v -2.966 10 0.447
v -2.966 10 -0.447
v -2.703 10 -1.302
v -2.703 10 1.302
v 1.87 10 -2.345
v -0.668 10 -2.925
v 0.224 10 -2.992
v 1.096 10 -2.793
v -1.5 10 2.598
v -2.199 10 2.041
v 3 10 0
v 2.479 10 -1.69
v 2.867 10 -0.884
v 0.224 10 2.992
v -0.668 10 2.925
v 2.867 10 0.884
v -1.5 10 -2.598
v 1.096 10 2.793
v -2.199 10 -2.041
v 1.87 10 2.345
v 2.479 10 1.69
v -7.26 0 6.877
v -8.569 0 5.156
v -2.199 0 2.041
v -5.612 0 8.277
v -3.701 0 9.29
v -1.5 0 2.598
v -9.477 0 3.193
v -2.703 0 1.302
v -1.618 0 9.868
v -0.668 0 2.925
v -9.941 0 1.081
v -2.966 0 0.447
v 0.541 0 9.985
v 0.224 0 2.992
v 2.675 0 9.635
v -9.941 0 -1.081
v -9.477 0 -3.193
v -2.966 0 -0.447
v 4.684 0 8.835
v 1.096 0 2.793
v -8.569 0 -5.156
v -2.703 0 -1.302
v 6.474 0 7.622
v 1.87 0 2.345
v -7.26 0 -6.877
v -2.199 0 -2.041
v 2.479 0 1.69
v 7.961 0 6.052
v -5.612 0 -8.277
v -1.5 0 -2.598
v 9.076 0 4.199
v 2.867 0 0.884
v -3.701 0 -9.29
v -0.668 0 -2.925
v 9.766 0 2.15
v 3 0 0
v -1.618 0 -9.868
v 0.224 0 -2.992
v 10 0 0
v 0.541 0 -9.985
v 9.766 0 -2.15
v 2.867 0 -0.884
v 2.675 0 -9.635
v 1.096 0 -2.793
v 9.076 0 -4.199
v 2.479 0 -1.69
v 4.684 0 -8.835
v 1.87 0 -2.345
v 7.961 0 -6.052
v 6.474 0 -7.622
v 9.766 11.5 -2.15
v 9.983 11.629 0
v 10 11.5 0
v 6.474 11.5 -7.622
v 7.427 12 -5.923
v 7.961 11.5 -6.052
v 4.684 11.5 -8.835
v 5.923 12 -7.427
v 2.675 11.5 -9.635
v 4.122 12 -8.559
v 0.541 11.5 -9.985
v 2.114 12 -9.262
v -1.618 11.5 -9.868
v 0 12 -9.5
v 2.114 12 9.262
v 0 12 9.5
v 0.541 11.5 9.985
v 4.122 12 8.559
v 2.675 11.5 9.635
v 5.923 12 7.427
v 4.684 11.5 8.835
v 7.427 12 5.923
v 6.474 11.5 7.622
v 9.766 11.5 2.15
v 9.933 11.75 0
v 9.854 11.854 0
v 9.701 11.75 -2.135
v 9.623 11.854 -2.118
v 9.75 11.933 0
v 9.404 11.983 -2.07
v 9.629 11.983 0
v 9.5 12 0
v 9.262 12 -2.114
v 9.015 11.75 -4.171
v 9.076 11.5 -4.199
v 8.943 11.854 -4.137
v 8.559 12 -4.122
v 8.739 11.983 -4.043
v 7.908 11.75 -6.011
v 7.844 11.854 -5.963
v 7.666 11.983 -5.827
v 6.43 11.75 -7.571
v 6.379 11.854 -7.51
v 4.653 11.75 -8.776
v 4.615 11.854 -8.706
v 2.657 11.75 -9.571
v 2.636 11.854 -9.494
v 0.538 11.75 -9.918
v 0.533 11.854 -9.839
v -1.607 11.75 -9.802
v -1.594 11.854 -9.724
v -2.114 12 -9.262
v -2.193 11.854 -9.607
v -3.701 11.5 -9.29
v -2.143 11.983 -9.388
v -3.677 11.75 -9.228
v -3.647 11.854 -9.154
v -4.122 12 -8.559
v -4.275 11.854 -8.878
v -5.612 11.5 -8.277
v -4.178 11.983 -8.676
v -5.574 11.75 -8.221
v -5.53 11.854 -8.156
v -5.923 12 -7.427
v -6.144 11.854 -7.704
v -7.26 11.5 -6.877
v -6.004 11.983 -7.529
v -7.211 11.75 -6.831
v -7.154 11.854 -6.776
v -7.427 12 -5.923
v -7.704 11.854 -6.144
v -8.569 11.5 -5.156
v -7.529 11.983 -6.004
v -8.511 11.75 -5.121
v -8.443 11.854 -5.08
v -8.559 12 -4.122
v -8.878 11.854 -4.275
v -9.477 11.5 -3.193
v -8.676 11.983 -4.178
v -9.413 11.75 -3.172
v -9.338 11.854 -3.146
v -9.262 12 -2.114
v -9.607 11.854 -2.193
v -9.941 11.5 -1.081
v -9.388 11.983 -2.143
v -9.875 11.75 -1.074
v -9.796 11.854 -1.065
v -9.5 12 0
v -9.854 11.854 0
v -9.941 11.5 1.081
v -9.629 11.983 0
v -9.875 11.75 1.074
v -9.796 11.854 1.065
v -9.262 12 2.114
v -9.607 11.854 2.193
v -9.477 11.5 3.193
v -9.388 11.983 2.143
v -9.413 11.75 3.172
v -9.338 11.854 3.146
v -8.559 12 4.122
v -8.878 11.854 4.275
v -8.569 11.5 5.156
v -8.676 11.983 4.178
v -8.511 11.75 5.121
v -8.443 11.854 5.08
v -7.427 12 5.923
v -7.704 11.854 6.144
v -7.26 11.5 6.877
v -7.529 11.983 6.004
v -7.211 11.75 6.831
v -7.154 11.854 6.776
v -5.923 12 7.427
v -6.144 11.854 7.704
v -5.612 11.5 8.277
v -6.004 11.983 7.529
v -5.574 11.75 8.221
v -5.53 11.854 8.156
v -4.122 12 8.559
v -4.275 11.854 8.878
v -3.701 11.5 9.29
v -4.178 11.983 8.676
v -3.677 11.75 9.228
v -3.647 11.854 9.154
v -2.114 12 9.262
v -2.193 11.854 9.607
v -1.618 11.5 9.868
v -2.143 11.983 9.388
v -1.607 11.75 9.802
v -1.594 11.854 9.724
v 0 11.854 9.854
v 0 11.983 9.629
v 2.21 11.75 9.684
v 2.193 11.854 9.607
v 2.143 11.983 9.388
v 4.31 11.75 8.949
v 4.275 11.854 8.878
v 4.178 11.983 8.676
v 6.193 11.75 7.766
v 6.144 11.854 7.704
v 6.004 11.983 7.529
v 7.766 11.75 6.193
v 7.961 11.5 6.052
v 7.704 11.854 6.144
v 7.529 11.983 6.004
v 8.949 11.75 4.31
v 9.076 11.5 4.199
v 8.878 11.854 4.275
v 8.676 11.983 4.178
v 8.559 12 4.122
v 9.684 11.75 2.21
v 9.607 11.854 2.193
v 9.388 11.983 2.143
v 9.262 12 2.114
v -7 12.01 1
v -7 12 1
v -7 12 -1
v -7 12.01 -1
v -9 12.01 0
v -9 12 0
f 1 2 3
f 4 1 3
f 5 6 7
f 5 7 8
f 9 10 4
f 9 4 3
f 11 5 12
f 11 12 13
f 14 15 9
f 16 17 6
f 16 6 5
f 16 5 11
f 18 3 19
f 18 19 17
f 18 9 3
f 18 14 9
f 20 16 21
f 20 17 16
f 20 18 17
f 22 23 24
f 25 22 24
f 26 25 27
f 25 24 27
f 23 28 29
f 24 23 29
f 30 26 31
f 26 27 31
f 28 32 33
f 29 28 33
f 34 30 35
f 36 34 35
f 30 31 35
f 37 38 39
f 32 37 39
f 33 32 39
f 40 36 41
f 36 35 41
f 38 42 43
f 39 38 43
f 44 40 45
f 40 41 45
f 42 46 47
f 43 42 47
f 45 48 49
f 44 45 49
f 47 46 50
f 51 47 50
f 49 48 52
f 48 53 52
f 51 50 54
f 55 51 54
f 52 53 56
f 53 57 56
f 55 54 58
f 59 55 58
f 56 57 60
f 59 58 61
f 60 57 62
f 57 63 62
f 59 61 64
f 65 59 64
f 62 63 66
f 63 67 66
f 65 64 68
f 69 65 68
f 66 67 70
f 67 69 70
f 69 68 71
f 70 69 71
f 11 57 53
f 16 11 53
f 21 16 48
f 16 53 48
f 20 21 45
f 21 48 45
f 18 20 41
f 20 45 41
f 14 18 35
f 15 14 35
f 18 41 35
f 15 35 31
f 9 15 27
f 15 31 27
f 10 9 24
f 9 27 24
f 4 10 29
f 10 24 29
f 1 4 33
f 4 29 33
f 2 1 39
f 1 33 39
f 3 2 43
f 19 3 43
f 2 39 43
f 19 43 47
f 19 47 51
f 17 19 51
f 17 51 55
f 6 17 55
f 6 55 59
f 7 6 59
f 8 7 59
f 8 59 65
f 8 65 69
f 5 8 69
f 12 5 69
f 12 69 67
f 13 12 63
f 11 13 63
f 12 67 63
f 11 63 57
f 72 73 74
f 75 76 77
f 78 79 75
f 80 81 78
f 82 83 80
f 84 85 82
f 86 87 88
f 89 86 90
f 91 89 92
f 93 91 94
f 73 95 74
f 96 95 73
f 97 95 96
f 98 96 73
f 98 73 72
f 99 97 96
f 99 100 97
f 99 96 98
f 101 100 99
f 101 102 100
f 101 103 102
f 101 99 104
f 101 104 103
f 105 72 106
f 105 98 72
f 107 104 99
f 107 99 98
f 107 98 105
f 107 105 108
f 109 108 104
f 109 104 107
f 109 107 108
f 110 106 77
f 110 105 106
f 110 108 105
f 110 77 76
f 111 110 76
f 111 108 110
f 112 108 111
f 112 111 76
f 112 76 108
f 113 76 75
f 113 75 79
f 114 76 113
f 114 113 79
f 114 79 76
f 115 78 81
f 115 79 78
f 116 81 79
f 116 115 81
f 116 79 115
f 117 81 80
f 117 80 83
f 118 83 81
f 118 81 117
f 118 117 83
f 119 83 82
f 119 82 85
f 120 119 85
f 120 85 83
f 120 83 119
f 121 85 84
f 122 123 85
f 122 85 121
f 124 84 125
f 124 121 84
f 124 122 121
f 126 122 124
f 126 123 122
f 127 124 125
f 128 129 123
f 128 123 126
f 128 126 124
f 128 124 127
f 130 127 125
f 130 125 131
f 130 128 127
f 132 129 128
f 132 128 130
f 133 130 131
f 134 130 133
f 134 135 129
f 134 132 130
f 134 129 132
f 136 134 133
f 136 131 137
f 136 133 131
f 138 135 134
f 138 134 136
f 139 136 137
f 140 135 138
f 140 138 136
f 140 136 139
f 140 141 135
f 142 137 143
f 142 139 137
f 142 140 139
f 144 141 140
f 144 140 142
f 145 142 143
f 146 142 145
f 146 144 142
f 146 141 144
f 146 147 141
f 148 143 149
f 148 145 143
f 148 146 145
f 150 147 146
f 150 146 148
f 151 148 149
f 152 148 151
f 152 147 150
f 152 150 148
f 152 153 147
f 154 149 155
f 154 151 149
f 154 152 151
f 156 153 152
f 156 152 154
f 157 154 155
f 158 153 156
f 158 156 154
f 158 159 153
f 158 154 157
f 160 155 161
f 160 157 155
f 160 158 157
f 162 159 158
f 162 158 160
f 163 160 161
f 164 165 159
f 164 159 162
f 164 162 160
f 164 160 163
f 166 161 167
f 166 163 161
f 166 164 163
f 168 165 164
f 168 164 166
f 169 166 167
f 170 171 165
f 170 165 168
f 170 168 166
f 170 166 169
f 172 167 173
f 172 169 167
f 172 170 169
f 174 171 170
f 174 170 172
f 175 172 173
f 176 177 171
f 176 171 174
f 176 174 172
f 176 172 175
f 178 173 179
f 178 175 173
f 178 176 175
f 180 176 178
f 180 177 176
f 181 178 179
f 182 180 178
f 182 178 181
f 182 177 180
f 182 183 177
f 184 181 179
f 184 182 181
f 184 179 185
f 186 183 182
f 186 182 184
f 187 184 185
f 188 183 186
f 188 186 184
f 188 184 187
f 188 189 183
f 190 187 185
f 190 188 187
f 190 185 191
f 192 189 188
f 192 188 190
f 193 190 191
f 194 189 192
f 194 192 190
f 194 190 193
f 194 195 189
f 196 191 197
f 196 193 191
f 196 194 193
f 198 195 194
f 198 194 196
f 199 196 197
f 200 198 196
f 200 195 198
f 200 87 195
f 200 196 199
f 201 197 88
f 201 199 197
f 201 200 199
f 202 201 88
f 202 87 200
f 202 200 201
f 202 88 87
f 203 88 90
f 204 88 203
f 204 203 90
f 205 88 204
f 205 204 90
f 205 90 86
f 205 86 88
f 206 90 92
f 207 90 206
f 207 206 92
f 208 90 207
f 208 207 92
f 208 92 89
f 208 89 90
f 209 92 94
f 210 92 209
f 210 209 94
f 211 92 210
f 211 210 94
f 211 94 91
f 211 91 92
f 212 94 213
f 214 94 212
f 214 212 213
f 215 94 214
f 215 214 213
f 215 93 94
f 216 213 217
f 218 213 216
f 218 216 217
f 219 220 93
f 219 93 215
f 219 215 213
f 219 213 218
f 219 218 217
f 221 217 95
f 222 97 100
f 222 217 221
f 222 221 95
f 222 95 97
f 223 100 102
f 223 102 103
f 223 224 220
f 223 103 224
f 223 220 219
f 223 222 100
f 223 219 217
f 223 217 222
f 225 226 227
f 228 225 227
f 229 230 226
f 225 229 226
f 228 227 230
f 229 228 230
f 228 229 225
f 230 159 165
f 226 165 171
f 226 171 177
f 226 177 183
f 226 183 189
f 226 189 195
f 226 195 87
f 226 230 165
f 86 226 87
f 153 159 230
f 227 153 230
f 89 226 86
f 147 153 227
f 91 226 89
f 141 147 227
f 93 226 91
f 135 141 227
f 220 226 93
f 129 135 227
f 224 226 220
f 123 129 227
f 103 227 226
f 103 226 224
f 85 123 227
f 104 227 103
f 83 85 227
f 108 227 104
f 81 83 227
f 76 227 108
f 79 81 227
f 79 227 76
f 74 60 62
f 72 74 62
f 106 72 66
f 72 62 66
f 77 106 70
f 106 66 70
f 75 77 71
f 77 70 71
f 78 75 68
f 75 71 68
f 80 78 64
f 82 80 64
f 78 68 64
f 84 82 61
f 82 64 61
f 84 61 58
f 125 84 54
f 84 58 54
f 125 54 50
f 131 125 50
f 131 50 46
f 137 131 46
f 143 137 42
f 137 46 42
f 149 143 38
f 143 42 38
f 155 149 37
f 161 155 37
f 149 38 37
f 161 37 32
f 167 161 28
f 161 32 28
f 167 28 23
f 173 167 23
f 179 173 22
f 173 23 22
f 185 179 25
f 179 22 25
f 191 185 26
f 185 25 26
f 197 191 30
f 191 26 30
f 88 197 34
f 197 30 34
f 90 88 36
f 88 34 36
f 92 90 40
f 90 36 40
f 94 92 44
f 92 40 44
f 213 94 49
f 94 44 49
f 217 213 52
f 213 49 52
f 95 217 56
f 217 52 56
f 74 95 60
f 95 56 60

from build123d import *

# Parameters (mm, degrees)
SKETCH1_R           = 10
BOSS_EXTRUDE1_DEPTH = 12
FILLET1_R           = 0.5
SKETCH2_R           = 3
CUT_EXTRUDE1_DEPTH  = 10
BOSS_EXTRUDE2_DEPTH = 0.01


with BuildPart() as part:
    # Sketch1 → Boss-Extrude1 (new body)
    with BuildSketch(Plane(origin=(0, 0, 0), x_dir=(1, 0, 0), z_dir=(0, 1, 0))):
        Circle(SKETCH1_R)
    extrude(amount=BOSS_EXTRUDE1_DEPTH)

    # Fillet1
    fillet1_edges = [part.edges().sort_by_distance(p)[0] for p in [
        (-10, 12, 0),
    ]]
    fillet(fillet1_edges, radius=FILLET1_R)

    # Sketch2 → Cut-Extrude1 (cut)
    with BuildSketch(Plane.XZ):
        Circle(SKETCH2_R)
    extrude(amount=-CUT_EXTRUDE1_DEPTH, mode=Mode.SUBTRACT)

    # Sketch3 → Boss-Extrude2 (add)
    with BuildSketch(Plane(origin=(0, 12, 0), x_dir=(1, 0, 0), z_dir=(0, 1, 0))):
        Polygon((-7, -1), (-7, 1), (-9, 0), align=None)
    extrude(amount=BOSS_EXTRUDE2_DEPTH)


solid = part.part
